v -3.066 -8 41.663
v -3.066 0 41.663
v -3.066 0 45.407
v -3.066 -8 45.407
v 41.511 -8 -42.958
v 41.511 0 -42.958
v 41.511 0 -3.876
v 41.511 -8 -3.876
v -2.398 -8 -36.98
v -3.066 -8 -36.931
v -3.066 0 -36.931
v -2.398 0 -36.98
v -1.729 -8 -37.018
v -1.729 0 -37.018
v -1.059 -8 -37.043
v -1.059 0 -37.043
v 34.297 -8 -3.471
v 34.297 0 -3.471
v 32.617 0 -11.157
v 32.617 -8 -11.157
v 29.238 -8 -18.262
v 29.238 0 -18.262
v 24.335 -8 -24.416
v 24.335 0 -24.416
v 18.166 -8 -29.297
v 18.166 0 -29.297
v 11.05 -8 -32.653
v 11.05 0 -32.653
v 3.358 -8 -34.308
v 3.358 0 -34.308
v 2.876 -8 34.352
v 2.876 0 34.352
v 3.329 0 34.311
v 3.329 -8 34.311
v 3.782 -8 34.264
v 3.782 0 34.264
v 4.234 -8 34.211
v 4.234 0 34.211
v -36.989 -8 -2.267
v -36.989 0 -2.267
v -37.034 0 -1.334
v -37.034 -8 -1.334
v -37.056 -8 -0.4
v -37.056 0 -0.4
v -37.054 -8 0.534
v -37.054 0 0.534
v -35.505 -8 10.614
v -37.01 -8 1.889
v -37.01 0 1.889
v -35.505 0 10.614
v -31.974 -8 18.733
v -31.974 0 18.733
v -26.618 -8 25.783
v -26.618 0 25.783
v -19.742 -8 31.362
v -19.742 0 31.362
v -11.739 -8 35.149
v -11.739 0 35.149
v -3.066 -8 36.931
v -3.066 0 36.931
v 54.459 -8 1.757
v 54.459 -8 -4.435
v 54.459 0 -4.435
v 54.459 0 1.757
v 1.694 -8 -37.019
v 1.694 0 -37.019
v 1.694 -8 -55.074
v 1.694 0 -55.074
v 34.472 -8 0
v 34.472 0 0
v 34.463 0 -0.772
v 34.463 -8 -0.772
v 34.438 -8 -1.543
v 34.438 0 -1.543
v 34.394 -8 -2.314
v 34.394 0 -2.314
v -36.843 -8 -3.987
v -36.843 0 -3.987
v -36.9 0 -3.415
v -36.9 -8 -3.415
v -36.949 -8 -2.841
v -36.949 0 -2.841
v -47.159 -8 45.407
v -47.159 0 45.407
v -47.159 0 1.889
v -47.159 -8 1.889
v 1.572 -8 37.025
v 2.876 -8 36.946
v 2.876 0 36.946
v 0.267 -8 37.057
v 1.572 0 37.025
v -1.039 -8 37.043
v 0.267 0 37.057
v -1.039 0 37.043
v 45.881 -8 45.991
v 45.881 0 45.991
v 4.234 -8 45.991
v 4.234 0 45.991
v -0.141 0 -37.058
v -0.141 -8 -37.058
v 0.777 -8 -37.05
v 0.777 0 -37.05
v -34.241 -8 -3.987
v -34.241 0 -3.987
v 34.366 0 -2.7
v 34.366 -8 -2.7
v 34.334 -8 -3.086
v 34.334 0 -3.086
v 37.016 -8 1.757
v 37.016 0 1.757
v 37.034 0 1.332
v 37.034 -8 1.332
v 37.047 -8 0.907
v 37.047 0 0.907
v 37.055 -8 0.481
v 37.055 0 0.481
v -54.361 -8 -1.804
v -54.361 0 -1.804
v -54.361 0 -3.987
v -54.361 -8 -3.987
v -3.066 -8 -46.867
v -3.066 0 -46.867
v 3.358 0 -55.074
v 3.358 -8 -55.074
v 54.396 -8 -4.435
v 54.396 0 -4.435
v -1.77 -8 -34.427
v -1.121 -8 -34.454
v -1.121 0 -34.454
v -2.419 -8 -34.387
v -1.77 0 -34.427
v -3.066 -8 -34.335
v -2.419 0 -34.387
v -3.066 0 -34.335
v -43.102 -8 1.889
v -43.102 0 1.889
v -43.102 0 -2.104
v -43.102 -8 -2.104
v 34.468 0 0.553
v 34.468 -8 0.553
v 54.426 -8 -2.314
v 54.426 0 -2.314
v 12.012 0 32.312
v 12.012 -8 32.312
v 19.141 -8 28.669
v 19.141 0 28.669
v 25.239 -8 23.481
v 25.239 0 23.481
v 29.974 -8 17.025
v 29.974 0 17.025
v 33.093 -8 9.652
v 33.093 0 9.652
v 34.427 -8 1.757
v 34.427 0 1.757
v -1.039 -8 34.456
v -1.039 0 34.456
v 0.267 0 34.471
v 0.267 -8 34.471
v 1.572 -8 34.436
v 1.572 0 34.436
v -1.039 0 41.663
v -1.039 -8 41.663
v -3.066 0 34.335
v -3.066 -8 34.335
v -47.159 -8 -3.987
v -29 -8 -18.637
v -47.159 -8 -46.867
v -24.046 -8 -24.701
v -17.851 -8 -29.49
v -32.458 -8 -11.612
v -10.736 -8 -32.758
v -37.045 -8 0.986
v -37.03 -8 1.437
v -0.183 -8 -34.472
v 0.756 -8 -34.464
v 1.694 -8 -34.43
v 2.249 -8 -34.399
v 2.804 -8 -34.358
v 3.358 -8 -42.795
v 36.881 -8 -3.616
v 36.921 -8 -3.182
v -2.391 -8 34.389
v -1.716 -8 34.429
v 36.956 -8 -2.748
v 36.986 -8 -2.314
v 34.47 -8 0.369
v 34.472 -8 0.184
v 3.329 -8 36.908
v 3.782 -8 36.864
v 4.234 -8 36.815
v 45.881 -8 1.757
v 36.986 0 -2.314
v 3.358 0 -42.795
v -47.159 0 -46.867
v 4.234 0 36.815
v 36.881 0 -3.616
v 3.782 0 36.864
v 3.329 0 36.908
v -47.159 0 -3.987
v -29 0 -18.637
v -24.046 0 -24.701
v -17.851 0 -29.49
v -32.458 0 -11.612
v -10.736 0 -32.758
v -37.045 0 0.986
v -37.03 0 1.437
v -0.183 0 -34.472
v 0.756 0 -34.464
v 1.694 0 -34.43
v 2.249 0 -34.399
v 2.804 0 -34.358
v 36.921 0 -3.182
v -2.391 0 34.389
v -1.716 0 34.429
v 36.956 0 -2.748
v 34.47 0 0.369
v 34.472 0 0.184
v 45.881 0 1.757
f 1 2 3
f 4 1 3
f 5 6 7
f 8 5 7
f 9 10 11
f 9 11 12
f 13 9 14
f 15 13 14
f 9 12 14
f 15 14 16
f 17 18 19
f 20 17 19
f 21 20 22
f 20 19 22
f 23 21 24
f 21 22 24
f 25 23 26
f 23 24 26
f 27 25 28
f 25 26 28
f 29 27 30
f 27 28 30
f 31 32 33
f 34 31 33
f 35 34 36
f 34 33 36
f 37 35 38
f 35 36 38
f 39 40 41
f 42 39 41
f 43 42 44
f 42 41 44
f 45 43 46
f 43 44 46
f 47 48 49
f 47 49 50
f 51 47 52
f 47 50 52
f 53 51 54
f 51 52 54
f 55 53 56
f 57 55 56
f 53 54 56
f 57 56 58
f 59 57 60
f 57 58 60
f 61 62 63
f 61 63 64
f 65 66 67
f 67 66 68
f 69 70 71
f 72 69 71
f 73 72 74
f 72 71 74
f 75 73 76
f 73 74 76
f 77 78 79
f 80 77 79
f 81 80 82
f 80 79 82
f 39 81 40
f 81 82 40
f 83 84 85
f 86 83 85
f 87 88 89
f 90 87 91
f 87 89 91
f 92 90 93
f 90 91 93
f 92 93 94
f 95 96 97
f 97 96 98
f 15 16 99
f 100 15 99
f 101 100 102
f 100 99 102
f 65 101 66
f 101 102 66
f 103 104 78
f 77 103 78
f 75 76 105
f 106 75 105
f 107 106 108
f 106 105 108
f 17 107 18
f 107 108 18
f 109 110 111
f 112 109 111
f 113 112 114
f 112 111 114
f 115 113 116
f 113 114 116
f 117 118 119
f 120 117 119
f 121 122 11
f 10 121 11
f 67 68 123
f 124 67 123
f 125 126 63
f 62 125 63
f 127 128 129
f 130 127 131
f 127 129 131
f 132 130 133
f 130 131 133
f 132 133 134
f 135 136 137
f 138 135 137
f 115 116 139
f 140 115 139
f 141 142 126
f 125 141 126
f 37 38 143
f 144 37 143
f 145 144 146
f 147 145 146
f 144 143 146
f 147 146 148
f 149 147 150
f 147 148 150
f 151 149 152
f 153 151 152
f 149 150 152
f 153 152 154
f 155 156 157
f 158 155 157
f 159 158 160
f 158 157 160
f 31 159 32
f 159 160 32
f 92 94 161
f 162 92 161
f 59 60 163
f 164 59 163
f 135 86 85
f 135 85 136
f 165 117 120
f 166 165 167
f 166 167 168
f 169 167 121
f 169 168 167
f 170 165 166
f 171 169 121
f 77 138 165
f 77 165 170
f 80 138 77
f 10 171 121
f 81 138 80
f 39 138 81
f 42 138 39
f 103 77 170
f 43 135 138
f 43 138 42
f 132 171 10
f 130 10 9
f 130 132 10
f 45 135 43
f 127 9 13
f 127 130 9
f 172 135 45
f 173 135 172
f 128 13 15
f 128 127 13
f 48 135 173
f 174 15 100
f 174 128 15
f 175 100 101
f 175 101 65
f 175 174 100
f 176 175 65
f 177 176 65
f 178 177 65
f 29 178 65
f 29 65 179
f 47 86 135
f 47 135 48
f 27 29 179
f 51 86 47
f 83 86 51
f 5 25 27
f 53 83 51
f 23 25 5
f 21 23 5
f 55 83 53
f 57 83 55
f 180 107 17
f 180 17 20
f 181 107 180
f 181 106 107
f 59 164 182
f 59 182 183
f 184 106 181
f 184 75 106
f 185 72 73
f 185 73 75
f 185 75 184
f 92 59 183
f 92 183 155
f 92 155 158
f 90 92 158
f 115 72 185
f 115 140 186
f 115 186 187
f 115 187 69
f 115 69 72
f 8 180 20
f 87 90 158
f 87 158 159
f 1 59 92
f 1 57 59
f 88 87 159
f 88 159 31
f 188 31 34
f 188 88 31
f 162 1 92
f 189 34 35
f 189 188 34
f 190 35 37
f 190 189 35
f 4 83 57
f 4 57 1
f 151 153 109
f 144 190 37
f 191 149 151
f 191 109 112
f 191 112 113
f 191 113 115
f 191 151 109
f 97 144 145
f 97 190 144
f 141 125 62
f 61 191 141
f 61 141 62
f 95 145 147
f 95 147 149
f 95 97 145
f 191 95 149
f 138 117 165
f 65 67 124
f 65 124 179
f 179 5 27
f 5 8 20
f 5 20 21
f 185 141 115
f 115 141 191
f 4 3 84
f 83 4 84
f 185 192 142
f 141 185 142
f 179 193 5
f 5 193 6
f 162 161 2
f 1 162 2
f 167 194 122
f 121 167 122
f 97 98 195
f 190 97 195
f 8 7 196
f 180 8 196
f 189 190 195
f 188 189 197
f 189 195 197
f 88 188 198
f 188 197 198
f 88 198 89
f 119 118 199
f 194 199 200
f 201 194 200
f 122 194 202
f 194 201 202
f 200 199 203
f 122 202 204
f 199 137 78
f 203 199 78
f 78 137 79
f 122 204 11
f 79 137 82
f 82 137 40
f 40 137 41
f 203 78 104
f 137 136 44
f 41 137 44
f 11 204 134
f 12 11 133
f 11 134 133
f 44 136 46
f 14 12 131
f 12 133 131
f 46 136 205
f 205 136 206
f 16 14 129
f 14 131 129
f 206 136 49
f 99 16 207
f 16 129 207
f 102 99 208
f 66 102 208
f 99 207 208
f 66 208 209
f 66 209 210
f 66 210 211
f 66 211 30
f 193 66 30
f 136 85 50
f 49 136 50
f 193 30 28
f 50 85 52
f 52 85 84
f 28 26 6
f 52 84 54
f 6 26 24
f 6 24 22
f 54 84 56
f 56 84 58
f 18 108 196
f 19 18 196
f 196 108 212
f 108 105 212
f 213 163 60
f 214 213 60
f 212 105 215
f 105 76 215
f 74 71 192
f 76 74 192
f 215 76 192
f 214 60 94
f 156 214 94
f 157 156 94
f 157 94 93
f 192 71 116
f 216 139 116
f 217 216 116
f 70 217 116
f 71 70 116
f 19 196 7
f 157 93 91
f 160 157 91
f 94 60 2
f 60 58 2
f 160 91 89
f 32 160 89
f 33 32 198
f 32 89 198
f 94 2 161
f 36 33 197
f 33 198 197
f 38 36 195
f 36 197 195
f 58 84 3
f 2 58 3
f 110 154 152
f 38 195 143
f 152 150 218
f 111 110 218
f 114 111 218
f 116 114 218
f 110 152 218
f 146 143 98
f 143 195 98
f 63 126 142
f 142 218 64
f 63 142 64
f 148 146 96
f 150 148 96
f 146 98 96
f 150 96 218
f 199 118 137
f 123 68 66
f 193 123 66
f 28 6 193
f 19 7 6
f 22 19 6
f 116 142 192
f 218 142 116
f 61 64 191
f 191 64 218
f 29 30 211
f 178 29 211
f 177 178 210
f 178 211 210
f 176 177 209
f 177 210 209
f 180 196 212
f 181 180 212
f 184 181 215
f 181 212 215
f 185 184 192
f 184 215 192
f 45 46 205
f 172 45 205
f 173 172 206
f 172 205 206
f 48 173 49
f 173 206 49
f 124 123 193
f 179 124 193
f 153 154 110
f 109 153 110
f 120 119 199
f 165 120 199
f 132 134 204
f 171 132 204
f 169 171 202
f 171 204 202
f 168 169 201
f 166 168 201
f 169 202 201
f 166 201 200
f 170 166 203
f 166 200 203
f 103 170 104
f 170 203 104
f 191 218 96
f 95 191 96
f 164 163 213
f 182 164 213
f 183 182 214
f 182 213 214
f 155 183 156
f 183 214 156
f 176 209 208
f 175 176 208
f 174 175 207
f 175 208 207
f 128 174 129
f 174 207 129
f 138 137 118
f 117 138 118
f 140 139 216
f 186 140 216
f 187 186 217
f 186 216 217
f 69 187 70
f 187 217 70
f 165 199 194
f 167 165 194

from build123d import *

# Parameters (mm, degrees)
F1_DEPTH = 8


with BuildPart() as f1:
    # F0 (on Front) → F1 (new body)
    with BuildSketch(Plane.XZ):
        Polygon((-47.1591800451, -3.9871255867), (-47.1591800451, -46.8671731651), (-3.0660768971, -46.8671731651), (-3.0660768971, -42.9581068456), (-43.1017912924, -42.9581068456), (-43.1017912924, -3.9871255867), align=None)
        Polygon((-54.3611483469, -3.9871255867), (-47.1591800451, -3.9871255867), (-43.1017912924, -3.9871255867), (-43.1017912924, -2.1041460184), (-54.3611483469, -1.8037535483), align=None)
        with BuildLine():
            Line((-43.1017912924, -42.9581068456), (-3.0660768971, -42.9581068456))
            Line((-3.0660768971, -42.9581068456), (-3.0660768971, -36.9308893154))
            ThreePointArc((-3.0660768971, -36.9308893154), (-25.8747586881, -26.5290081986), (-36.8428316328, -3.9871255867))
            Line((-36.8428316328, -3.9871255867), (-43.1017912924, -3.9871255867))
            Line((-43.1017912924, -3.9871255867), (-43.1017912924, -42.9581068456))
        make_face()
        with BuildLine():
            Line((-43.1017912924, -2.1041460184), (-43.1017912924, -3.9871255867))
            Line((-43.1017912924, -3.9871255867), (-36.8428316328, -3.9871255867))
            ThreePointArc((-36.8428316328, -3.9871255867), (-36.9256932446, -3.12803318), (-36.9885254852, -2.2672440539))
            Line((-36.9885254852, -2.2672440539), (-43.1017912924, -2.1041460184))
        make_face()
        with BuildLine():
            ThreePointArc((-36.8428316328, -3.9871255867), (-25.8747586881, -26.5290081986), (-3.0660768971, -36.9308893154))
            Line((-3.0660768971, -36.9308893154), (-3.0660768971, -34.3354971844))
            ThreePointArc((-3.0660768971, -34.3354971844), (-24.0459151958, -24.7006306971), (-34.2407655288, -3.9871255867))
            Line((-34.2407655288, -3.9871255867), (-36.8428316328, -3.9871255867))
        make_face()
        with BuildLine():
            Line((-3.0660768971, -34.3354971844), (-3.0660768971, -36.9308893154))
            ThreePointArc((-3.0660768971, -36.9308893154), (-2.0633689571, -37.0004583987), (-1.0591430979, -37.0428080613))
            Line((-1.0591430979, -37.0428080613), (-1.1211578882, -34.4538851137))
            ThreePointArc((-1.1211578882, -34.4538851137), (-2.0944540368, -34.4084358367), (-3.0660768971, -34.3354971844))
        make_face()
        with BuildLine():
            Line((-43.1017912924, 0.534063729), (-43.1017912924, -2.1041460184))
            Line((-43.1017912924, -2.1041460184), (-36.9885254852, -2.2672440539))
            ThreePointArc((-36.9885254852, -2.2672440539), (-37.0477983113, -0.867210155), (-37.0540981418, 0.534063729))
            Line((-37.0540981418, 0.534063729), (-43.1017912924, 0.534063729))
        make_face()
        with BuildLine():
            Line((-1.1211578882, -34.4538851137), (-1.0591430979, -37.0428080613))
            ThreePointArc((-1.0591430979, -37.0428080613), (0.3177187709, -37.0565846774), (1.6941420035, -37.0192017207))
            Line((1.6941420035, -37.0192017207), (1.6941420035, -34.4304672828))
            ThreePointArc((1.6941420035, -34.4304672828), (0.2867312292, -34.4709294862), (-1.1211578882, -34.4538851137))
        make_face()
        with BuildLine():
            Line((-43.1017912924, 1.8888709601), (-43.1017912924, 0.534063729))
            Line((-43.1017912924, 0.534063729), (-37.0540981418, 0.534063729))
            ThreePointArc((-37.0540981418, 0.534063729), (-37.0381326331, 1.2116700136), (-37.0097768119, 1.8888709601))
            Line((-37.0097768119, 1.8888709601), (-43.1017912924, 1.8888709601))
        make_face()
        with BuildLine():
            ThreePointArc((3.3580851741, -36.9054830226), (2.5267534207, -36.9717044551), (1.6941420035, -37.0192017207))
            Line((1.6941420035, -37.0192017207), (1.6941420035, -55.0743453205))
            Line((1.6941420035, -55.0743453205), (3.3580851741, -55.0743453205))
            Line((3.3580851741, -55.0743453205), (3.3580851741, -46.8671731651))
            Line((3.3580851741, -46.8671731651), (3.3580851741, -42.7945544943))
            Line((3.3580851741, -42.7945544943), (3.3580851741, -36.9054830226))
        make_face()
        with BuildLine():
            Line((1.6941420035, -34.4304672828), (1.6941420035, -37.0192017207))
            ThreePointArc((1.6941420035, -37.0192017207), (2.5267534207, -36.9717044551), (3.3580851741, -36.9054830226))
            Line((3.3580851741, -36.9054830226), (3.3580851741, -34.3081689748))
            ThreePointArc((3.3580851741, -34.3081689748), (2.5268535934, -34.3793863435), (1.6941420035, -34.4304672828))
        make_face()
        Polygon((-47.1591800451, 1.8888709601), (-43.1017912924, 1.8888709601), (-43.1017912924, 41.1945804954), (-43.1017912924, 41.6629081592), (-3.0660768971, 41.6629081592), (-3.0660768971, 45.4071350396), (-47.1591800451, 45.4071350396), align=None)
        with BuildLine():
            Line((-43.1017912924, 41.1945804954), (-43.1017912924, 1.8888709601))
            Line((-43.1017912924, 1.8888709601), (-37.0097768119, 1.8888709601))
            ThreePointArc((-37.0097768119, 1.8888709601), (-26.6177436164, 25.7834663678), (-3.0660768971, 36.9308893154))
            Line((-3.0660768971, 36.9308893154), (-3.0660768971, 41.6629081592))
            Line((-3.0660768971, 41.6629081592), (-43.1017912924, 41.6629081592))
            Line((-43.1017912924, 41.6629081592), (-43.1017912924, 41.1945804954))
        make_face()
        with BuildLine():
            ThreePointArc((36.8810945474, -3.6161136812), (26.1121317389, -26.295398632), (3.3580851741, -36.9054830226))
            Line((3.3580851741, -36.9054830226), (3.3580851741, -42.7945544943))
            Line((3.3580851741, -42.7945544943), (41.5107160807, -42.9581068456))
            Line((41.5107160807, -42.9581068456), (41.5107160807, -3.876257455))
            Line((41.5107160807, -3.876257455), (36.8810945474, -3.6161136813))
        make_face()
        with BuildLine():
            Line((3.3580851741, -34.3081689748), (3.3580851741, -36.9054830226))
            ThreePointArc((3.3580851741, -36.9054830226), (26.1121317389, -26.295398632), (36.8810945474, -3.6161136812))
            Line((36.8810945474, -3.6161136813), (34.2969386269, -3.4709069795))
            ThreePointArc((34.2969386269, -3.4709069795), (24.3353526008, -24.4155239189), (3.3580851741, -34.3081689748))
        make_face()
        with BuildLine():
            Line((34.2969386269, -3.4709069795), (36.8810945474, -3.6161136813))
            ThreePointArc((36.8810945474, -3.6161136812), (36.9391000222, -2.9655189628), (36.9856296892, -2.3140029516))
            Line((36.9856296892, -2.3140029516), (34.3943685039, -2.3140029516))
            ThreePointArc((34.3943685039, -2.3140029516), (34.3505243856, -2.8928651668), (34.2969386269, -3.4709069795))
        make_face()
        with BuildLine():
            ThreePointArc((-1.0392403929, 37.0433717765), (-2.0534289831, 37.0010113724), (-3.0660768971, 36.9308893154))
            Line((-3.0660768971, 36.9308893154), (-3.0660768971, 34.3354971844))
            ThreePointArc((-3.0660768971, 34.3354971844), (-2.0535493927, 34.4109013153), (-1.0392403929, 34.4564532976))
            Line((-1.0392403929, 34.4564532976), (-1.0392403929, 37.0433717765))
        make_face()
        with BuildLine():
            Line((-3.0660768971, 41.6629081592), (-3.0660768971, 36.9308893154))
            ThreePointArc((-3.0660768971, 36.9308893154), (-2.0534289831, 37.0010113724), (-1.0392403929, 37.0433717765))
            Line((-1.0392403929, 37.0433717765), (-1.0392403929, 41.6629081592))
            Line((-1.0392403929, 41.6629081592), (-3.0660768971, 41.6629081592))
        make_face()
        with BuildLine():
            Line((34.3943685039, -2.3140029516), (36.9856296892, -2.3140029516))
            ThreePointArc((36.9856296892, -2.3140029516), (37.0398630305, -1.157566349), (37.0579466939, 0))
            ThreePointArc((37.0579466939, 0), (37.0571653007, 0.2406512887), (37.0548211541, 0.4812924287))
            Line((37.0548211541, 0.4812924287), (34.4676887508, 0.5528350755))
            ThreePointArc((34.4676887508, 0.5528350755), (34.4710136618, 0.2764264252), (34.4721219892, 0))
            ThreePointArc((34.4721219892, 0), (34.4526781343, -1.1576544459), (34.3943685039, -2.3140029516))
        make_face()
        with BuildLine():
            ThreePointArc((37.0579466939, 0), (37.0398630305, -1.157566349), (36.9856296892, -2.3140029516))
            Line((36.9856296892, -2.3140029516), (54.4263494667, -2.3140029516))
            Line((54.4263494667, -2.3140029516), (54.4593664818, 0))
            Line((54.4593664818, 0), (45.8812378347, 0.2372132275))
            Line((45.8812378347, 0.2372132275), (37.0548211541, 0.4812924287))
            ThreePointArc((37.0548211541, 0.4812924287), (37.0571653007, 0.2406512887), (37.0579466939, 0))
        make_face()
        with BuildLine():
            ThreePointArc((2.8755131643, 36.9462154653), (0.919420611, 37.0465393648), (-1.0392403929, 37.0433717765))
            Line((-1.0392403929, 37.0433717765), (-1.0392403929, 34.4564532976))
            ThreePointArc((-1.0392403929, 34.4564532976), (0.9196211301, 34.4598533284), (2.8755131643, 34.351981289))
            Line((2.8755131643, 34.351981289), (2.8755131643, 36.9462154653))
        make_face()
        Polygon((54.4593664818, 0), (54.4263494667, -2.3140029516), (54.3960799696, -4.4354456477), (54.4593664818, -4.4354456477), align=None)
        with BuildLine():
            ThreePointArc((4.2341067456, 36.8152652202), (3.5554128885, 36.886995708), (2.8755131643, 36.9462154653))
            Line((2.8755131643, 36.9462154653), (2.8755131643, 34.351981289))
            ThreePointArc((2.8755131643, 34.351981289), (3.555507773, 34.2882714484), (4.2341067456, 34.2111025035))
            Line((4.2341067456, 34.2111025035), (4.2341067456, 36.8152652202))
        make_face()
        with BuildLine():
            ThreePointArc((37.0162491765, 1.7574726371), (37.0410316266, 1.119548661), (37.0548211541, 0.4812924287))
            Line((37.0548211541, 0.4812924287), (45.8812378347, 0.2372132275))
            Line((45.8812378347, 0.2372132275), (45.8812378347, 1.7574726371))
            Line((45.8812378347, 1.7574726371), (41.5107160807, 1.7574726371))
            Line((41.5107160807, 1.7574726371), (37.0162491765, 1.7574726371))
        make_face()
        Polygon((45.8812378347, 0.2372132275), (54.4593664818, 0), (54.4593664818, 1.7574726371), (45.8812378347, 1.7574726371), align=None)
        with BuildLine():
            ThreePointArc((37.0162491765, 1.7574726371), (27.0676960808, 25.3106942229), (4.2341067456, 36.8152652202))
            Line((4.2341067456, 36.8152652202), (4.2341067456, 34.2111025035))
            ThreePointArc((4.2341067456, 34.2111025035), (25.2385711785, 23.4806669264), (34.427292725, 1.7574726371))
            Line((34.427292725, 1.7574726371), (37.0162491765, 1.7574726371))
        make_face()
        with BuildLine():
            Line((4.2341067456, 41.2198267877), (4.2341067456, 36.8152652202))
            ThreePointArc((4.2341067456, 36.8152652202), (27.0676960808, 25.3106942229), (37.0162491765, 1.7574726371))
            Line((37.0162491765, 1.7574726371), (41.5107160807, 1.7574726371))
            Line((41.5107160807, 1.7574726371), (41.5107160807, 41.2198267877))
            Line((41.5107160807, 41.2198267877), (4.2341067456, 41.2198267877))
        make_face()
        Polygon((4.2341067456, 45.9911525249), (4.2341067456, 41.2198267877), (41.5107160807, 41.2198267877), (41.5107160807, 1.7574726371), (45.8812378347, 1.7574726371), (45.8812378347, 45.9911525249), align=None)
    extrude(amount=F1_DEPTH)


solid = f1.part
